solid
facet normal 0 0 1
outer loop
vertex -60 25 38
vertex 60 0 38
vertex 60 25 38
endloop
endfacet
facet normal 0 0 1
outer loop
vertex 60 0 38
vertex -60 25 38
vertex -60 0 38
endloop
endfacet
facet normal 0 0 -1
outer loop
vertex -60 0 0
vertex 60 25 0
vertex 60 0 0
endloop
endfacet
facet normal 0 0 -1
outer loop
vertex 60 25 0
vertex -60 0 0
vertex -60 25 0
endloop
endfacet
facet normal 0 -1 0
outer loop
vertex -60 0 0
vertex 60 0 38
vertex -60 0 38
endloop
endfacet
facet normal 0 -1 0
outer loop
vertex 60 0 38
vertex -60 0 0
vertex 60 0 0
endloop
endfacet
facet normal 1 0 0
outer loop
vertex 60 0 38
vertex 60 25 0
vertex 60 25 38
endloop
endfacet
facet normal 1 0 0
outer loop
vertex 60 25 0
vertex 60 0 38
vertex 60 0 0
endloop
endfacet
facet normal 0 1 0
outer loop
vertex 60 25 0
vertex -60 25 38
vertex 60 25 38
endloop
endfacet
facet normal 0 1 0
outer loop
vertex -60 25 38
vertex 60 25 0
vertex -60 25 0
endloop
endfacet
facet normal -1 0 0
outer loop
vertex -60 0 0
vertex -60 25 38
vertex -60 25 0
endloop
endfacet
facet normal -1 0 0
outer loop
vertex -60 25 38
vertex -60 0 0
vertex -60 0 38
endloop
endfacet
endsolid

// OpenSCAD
//:Model "LiPo" [0.2,0.2,1.0]
//:Mass 220
module lipo()
{
    color([0.2,0.2,1.0])
    translate([-60,0,0])
    cube([120, 25, 38]);
}

lipo();
